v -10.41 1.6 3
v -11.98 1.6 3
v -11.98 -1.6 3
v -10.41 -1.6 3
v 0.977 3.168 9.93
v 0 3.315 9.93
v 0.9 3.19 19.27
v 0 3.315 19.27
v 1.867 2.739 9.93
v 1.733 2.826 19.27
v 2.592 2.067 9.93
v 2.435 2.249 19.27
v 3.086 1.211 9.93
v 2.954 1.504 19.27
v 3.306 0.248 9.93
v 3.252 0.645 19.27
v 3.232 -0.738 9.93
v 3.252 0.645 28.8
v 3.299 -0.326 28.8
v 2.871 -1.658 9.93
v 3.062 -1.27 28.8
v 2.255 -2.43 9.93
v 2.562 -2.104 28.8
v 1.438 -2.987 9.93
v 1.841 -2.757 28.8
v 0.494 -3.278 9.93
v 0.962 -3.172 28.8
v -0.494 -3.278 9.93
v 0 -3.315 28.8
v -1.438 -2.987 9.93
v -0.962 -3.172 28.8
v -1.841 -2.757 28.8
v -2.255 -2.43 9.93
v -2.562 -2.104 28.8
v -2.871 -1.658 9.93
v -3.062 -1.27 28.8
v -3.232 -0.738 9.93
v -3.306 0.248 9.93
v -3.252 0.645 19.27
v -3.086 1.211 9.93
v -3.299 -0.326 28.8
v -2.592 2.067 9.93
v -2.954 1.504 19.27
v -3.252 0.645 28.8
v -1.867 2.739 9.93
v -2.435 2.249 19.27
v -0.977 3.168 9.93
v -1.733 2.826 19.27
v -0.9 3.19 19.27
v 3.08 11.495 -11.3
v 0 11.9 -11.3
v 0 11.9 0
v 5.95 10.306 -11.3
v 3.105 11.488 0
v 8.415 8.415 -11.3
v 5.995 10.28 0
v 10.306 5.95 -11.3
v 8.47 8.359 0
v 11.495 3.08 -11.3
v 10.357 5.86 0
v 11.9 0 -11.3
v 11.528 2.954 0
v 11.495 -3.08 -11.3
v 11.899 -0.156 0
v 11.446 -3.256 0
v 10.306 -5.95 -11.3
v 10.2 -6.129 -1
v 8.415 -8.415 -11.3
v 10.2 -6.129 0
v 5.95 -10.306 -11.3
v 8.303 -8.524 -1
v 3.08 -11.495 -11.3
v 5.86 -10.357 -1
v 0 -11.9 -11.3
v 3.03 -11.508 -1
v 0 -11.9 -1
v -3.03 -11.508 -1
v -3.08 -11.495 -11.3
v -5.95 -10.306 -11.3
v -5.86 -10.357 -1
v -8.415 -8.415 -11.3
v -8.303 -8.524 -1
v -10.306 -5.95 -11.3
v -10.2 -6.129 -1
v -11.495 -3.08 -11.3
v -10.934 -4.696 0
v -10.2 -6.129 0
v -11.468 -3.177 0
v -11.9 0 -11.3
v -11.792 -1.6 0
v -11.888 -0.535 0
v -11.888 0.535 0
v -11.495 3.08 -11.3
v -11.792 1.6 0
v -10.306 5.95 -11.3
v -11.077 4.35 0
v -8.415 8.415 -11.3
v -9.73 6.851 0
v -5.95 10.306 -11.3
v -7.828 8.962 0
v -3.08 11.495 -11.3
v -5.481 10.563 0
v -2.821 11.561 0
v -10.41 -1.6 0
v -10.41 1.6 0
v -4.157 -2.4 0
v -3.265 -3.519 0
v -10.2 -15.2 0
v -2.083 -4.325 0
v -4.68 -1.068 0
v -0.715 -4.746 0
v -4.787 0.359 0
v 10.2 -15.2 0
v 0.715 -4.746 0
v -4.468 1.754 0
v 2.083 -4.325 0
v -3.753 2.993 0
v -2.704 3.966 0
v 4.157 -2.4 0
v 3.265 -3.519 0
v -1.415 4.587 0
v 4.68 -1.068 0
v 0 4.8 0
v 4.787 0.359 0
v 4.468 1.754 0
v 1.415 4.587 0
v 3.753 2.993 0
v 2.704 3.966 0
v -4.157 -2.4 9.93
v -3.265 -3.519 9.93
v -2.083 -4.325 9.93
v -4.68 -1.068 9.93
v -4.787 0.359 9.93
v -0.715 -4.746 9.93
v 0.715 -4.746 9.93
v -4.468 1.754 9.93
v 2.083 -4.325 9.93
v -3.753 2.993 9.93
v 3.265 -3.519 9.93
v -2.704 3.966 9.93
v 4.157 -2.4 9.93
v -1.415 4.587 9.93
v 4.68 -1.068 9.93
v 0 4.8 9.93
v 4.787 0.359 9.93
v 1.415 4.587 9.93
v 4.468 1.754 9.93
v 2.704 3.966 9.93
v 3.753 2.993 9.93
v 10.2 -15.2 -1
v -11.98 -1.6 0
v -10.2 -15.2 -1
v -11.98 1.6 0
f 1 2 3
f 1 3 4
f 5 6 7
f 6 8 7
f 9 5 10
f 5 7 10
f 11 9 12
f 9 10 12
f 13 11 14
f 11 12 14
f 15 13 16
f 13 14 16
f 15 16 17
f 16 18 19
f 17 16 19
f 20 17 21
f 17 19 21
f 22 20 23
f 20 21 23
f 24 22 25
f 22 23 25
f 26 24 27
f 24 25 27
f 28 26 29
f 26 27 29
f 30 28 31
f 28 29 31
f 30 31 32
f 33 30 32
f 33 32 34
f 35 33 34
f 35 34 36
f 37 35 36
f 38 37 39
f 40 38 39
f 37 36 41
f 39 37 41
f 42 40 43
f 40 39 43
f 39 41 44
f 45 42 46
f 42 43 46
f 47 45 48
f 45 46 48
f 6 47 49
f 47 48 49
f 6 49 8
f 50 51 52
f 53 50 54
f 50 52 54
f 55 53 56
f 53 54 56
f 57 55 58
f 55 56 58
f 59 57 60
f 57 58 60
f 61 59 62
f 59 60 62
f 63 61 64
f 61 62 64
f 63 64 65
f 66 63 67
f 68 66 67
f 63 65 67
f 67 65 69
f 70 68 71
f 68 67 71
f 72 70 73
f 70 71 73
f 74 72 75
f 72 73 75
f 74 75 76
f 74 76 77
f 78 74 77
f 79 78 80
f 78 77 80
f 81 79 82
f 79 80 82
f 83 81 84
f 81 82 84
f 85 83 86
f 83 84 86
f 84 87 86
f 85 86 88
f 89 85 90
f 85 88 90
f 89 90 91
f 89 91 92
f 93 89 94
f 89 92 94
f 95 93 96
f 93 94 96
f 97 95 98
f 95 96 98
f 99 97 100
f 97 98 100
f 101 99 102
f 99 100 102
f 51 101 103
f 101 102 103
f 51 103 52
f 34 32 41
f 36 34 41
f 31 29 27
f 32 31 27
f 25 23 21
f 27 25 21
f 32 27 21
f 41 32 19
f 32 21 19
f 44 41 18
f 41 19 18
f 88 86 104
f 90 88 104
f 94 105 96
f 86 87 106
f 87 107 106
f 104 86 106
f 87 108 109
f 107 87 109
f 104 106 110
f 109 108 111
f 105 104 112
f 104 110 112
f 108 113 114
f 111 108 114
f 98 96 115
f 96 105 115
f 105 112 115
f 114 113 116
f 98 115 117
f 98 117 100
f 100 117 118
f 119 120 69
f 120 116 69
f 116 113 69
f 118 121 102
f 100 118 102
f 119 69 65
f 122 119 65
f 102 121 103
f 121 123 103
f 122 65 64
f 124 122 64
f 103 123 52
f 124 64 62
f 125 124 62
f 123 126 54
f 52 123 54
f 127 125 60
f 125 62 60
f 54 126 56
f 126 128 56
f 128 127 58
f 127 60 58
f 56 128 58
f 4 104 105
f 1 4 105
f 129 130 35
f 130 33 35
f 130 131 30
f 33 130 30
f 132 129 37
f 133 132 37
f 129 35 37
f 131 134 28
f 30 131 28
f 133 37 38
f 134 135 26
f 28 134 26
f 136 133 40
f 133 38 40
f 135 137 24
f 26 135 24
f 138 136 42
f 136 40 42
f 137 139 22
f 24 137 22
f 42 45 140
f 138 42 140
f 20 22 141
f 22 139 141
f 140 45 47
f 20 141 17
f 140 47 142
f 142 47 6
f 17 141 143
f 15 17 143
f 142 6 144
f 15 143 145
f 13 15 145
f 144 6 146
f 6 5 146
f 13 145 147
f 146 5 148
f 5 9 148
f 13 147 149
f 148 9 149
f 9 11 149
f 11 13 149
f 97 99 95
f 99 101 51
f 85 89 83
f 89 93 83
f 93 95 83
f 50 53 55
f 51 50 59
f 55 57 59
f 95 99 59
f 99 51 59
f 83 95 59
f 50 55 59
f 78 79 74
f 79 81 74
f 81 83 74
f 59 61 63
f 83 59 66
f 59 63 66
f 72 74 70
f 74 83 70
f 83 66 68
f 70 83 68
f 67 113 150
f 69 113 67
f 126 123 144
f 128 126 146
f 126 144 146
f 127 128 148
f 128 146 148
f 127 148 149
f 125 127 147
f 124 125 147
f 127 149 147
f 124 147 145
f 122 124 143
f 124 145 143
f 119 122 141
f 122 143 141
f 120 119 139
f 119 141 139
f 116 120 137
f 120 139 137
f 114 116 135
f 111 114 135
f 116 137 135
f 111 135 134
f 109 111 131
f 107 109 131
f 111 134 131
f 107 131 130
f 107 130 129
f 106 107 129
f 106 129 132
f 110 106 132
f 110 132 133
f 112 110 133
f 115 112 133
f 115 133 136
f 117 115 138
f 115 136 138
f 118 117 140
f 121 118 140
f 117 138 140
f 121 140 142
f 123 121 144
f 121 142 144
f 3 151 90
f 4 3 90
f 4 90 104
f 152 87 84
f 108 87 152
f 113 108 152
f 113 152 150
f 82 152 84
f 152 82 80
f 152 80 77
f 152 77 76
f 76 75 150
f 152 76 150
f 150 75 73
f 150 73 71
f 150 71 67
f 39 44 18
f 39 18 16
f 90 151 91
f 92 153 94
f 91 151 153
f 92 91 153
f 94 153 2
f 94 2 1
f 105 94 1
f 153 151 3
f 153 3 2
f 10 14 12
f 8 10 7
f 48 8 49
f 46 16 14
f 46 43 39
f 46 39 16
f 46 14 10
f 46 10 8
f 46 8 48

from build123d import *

# Parameters (mm, degrees)
CROQUIS2_W                 = 1.57
CROQUIS2_H                 = 3.2
SALIENTE_EXTRUIR1_DEPTH    = 3
SALIENTE_EXTRUIR2_DEPTH    = 1
CROQUIS4_W                 = 9.53
CROQUIS4_H                 = 2.67
CORTAR_EXTRUIR1_DEPTH      = 12.9
CORTAR_EXTRUIR1_DEPTH_BACK = 12.98


with BuildPart() as part:
    # Croquis1 → Revolución2 (revolve)
    with BuildSketch(Plane(origin=(0, 0, 0), x_dir=(0, 0, -1), z_dir=(1, 0, 0))):
        Polygon((0, 0), (11.3, 0), (11.3, 11.9), (0, 11.9), (0, 4.8), (-9.93, 4.8), (-9.93, 3.315), (-28.8, 3.315), (-28.8, 0), align=None)
    revolve(axis=Axis((0, 0, 28.8), (0, 0, -1)))

    # Croquis2 → Saliente-Extruir1 (add)
    with BuildSketch(Plane.XY):
        with Locations((-11.195, 0)):
            Rectangle(CROQUIS2_W, CROQUIS2_H)
    extrude(amount=SALIENTE_EXTRUIR1_DEPTH)

    # Croquis3 → Saliente-Extruir2 (add)
    with BuildSketch(Plane.XY):
        with BuildLine():
            Line((-10.2, -15.2), (10.2, -15.2))
            Line((10.2, -15.2), (10.2, -6.129437168))
            ThreePointArc((10.2, -6.129437168), (0, -11.9), (-10.2, -6.129437168))
            Line((-10.2, -6.129437168), (-10.2, -15.2))
        make_face()
    extrude(amount=-SALIENTE_EXTRUIR2_DEPTH)

    # Croquis4 → Cortar-Extruir1 (cut, two sides)
    with BuildSketch(Plane(origin=(0, 0, 0), x_dir=(0, 0, -1), z_dir=(1, 0, 0))) as cortar_extruir1_sk:
        with Locations((-24.035, 1.98)):
            Rectangle(CROQUIS4_W, CROQUIS4_H)
    extrude(amount=CORTAR_EXTRUIR1_DEPTH, mode=Mode.SUBTRACT)
    extrude(cortar_extruir1_sk.sketch, amount=-CORTAR_EXTRUIR1_DEPTH_BACK, mode=Mode.SUBTRACT)


solid = part.part
